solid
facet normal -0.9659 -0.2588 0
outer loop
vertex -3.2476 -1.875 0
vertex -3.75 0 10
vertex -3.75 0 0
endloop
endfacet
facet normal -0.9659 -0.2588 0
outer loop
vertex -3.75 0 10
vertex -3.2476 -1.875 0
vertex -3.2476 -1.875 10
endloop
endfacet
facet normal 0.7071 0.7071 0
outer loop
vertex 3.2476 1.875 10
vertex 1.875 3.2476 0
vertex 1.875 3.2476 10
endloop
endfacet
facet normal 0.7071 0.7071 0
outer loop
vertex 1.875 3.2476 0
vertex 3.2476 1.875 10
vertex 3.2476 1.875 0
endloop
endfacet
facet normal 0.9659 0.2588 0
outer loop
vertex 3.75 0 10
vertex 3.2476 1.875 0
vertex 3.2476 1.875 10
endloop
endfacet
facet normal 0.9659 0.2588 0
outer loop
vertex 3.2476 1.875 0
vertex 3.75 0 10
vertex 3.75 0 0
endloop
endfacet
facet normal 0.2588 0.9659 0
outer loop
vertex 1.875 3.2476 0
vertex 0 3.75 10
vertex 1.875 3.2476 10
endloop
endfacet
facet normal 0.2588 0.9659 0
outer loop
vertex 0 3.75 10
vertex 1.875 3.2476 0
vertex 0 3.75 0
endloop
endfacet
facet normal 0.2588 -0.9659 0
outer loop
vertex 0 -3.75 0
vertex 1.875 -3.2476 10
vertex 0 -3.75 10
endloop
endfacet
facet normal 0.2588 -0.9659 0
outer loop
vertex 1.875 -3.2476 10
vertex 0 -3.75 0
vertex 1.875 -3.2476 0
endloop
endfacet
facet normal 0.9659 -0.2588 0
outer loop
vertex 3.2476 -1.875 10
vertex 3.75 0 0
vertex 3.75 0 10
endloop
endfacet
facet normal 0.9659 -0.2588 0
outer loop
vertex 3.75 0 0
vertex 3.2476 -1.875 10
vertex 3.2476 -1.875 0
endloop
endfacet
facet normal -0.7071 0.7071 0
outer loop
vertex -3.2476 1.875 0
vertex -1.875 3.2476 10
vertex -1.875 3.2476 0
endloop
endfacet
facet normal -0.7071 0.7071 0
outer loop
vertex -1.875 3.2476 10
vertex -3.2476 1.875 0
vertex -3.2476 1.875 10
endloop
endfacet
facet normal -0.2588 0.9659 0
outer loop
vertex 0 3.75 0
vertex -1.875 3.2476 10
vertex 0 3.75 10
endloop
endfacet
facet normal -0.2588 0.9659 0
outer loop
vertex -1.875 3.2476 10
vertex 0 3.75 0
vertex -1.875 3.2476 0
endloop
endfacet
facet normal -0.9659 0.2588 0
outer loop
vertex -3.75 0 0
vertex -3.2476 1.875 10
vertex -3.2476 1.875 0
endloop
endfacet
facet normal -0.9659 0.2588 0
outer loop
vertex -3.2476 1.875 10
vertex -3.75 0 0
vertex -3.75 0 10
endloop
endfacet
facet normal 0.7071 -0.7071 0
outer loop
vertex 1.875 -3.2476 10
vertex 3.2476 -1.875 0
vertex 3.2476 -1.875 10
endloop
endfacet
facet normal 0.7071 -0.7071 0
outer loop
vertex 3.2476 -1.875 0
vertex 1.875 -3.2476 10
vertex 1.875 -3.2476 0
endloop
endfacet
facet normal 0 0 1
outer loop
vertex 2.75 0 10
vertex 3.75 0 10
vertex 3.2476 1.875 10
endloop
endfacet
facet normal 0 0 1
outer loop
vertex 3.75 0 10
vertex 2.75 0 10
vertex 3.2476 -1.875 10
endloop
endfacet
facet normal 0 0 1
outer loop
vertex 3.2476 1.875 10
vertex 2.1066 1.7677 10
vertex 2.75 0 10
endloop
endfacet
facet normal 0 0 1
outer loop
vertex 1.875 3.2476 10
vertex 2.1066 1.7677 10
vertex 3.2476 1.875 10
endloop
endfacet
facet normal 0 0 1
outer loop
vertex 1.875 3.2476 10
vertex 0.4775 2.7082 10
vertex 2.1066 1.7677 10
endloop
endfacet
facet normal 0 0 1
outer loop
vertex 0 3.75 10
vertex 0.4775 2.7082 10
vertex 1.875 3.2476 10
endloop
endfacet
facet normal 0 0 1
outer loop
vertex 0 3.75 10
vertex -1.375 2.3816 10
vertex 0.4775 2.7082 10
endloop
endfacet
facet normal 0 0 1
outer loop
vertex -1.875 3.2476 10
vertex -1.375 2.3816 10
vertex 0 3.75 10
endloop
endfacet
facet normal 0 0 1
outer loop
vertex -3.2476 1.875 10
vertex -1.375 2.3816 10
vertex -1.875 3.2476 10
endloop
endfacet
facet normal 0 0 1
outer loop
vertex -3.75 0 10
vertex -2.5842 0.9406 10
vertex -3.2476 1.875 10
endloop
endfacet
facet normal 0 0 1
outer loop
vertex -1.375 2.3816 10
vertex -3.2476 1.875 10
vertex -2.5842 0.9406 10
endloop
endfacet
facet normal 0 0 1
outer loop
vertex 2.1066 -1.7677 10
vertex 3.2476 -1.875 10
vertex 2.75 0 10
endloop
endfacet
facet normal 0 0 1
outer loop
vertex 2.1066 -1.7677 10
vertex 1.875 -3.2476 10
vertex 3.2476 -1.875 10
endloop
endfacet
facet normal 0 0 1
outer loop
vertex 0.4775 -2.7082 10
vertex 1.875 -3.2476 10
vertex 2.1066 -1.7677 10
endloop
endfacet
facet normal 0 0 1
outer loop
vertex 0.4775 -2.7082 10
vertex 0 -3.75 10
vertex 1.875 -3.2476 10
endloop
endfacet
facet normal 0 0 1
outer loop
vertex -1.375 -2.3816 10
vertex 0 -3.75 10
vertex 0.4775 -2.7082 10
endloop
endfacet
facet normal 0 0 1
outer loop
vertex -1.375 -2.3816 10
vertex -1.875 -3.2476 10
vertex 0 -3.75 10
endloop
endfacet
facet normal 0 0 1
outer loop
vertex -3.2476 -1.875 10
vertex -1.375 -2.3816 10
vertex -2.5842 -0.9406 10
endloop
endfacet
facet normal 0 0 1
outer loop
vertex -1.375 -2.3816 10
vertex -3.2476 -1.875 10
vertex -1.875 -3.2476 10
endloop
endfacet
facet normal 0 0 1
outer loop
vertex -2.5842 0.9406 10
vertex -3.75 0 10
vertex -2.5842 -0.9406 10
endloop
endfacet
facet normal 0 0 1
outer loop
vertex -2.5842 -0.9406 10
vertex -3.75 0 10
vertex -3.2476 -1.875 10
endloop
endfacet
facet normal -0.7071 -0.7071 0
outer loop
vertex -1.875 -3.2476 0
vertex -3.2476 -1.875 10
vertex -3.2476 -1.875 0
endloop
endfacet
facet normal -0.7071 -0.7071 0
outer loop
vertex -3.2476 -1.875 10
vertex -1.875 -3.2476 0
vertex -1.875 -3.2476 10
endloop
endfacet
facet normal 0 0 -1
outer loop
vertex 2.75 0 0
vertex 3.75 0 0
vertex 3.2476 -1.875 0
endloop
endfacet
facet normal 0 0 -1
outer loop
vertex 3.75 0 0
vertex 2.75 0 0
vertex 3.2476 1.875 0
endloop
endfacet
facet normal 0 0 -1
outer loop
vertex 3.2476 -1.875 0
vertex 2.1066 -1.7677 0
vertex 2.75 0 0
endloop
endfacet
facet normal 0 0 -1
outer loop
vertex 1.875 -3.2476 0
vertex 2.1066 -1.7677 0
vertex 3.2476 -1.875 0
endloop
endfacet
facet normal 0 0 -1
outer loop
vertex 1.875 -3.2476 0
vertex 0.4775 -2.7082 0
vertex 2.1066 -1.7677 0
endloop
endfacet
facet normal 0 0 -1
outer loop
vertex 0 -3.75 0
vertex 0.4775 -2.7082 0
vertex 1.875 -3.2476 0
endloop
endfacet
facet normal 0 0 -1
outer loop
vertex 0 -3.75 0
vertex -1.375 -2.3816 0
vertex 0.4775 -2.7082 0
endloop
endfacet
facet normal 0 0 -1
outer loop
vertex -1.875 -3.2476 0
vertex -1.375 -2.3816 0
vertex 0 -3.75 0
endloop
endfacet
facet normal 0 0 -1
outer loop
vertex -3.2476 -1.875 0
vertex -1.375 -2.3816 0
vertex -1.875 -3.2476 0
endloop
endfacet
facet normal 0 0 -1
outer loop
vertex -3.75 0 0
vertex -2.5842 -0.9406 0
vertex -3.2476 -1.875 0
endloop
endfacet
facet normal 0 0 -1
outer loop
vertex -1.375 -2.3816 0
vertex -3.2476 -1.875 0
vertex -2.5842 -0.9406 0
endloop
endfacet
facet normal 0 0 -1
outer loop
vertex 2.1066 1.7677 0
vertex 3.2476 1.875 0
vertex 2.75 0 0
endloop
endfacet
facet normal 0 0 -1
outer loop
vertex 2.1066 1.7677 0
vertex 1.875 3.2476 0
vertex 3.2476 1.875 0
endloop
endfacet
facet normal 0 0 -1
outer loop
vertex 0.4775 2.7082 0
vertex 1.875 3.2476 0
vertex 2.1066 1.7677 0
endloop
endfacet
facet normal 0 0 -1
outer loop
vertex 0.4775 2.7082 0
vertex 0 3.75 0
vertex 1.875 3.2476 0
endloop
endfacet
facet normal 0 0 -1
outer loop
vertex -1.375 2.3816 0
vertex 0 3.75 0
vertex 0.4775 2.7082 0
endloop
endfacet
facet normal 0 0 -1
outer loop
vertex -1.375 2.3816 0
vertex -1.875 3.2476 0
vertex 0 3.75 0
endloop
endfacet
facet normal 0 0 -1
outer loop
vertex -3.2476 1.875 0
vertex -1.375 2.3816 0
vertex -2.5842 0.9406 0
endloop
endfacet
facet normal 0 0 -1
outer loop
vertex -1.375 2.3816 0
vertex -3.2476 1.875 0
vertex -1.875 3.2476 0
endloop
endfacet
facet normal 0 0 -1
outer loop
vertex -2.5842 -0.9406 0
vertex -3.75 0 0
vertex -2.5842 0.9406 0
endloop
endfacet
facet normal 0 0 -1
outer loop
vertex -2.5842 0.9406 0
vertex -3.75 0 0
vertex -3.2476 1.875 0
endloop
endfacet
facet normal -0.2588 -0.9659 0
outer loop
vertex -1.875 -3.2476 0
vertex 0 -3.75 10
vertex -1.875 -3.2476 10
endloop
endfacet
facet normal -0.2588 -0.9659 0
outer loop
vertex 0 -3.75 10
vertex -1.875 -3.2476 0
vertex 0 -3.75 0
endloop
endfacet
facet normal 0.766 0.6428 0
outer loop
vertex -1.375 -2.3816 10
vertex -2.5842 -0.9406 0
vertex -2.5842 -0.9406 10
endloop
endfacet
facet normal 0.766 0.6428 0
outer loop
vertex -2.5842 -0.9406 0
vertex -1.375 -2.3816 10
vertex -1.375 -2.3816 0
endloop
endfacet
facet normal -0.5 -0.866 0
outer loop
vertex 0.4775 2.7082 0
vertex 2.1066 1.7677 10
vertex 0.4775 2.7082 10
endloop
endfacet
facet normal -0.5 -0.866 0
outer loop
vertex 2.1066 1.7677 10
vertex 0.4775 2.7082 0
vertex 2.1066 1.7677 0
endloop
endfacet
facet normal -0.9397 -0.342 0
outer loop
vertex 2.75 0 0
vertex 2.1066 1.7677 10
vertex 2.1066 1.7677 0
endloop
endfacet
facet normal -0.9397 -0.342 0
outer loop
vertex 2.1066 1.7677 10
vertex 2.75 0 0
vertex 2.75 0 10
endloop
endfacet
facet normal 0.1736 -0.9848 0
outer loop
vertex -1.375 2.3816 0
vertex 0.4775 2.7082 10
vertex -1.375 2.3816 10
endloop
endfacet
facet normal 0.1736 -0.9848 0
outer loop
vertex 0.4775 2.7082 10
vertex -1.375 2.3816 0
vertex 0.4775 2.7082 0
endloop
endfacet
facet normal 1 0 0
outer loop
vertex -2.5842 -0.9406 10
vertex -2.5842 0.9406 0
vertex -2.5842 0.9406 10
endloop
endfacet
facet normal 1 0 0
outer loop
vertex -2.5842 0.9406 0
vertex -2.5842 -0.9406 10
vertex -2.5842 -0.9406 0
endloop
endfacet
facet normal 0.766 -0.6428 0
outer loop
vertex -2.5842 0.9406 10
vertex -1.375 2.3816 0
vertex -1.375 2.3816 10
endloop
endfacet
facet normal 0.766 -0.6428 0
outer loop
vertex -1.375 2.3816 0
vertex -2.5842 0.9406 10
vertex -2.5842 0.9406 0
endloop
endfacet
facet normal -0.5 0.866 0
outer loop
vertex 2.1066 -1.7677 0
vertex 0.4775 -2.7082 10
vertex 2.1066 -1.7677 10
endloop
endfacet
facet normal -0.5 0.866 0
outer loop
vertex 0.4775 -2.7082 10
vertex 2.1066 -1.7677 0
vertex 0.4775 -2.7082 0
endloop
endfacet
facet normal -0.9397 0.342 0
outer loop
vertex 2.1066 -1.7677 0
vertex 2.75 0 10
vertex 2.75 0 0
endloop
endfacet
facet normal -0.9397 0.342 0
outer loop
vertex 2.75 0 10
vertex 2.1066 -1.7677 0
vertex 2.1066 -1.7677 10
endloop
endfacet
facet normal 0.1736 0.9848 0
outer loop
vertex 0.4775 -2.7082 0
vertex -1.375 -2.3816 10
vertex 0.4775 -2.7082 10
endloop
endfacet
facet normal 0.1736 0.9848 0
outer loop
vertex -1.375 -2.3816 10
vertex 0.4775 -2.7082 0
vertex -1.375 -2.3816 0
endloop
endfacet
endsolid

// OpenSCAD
// Uncomment before final render
//$fa = 0.01;
//$fs = 0.25;

module xAxisPulleySpacer () {
  difference() {
    cylinder(10, 3.75, 3.75);
    translate([0, 0, -1]) {
      cylinder(12, 2.75, 2.75);
    }
  }
}

xAxisPulleySpacer();
